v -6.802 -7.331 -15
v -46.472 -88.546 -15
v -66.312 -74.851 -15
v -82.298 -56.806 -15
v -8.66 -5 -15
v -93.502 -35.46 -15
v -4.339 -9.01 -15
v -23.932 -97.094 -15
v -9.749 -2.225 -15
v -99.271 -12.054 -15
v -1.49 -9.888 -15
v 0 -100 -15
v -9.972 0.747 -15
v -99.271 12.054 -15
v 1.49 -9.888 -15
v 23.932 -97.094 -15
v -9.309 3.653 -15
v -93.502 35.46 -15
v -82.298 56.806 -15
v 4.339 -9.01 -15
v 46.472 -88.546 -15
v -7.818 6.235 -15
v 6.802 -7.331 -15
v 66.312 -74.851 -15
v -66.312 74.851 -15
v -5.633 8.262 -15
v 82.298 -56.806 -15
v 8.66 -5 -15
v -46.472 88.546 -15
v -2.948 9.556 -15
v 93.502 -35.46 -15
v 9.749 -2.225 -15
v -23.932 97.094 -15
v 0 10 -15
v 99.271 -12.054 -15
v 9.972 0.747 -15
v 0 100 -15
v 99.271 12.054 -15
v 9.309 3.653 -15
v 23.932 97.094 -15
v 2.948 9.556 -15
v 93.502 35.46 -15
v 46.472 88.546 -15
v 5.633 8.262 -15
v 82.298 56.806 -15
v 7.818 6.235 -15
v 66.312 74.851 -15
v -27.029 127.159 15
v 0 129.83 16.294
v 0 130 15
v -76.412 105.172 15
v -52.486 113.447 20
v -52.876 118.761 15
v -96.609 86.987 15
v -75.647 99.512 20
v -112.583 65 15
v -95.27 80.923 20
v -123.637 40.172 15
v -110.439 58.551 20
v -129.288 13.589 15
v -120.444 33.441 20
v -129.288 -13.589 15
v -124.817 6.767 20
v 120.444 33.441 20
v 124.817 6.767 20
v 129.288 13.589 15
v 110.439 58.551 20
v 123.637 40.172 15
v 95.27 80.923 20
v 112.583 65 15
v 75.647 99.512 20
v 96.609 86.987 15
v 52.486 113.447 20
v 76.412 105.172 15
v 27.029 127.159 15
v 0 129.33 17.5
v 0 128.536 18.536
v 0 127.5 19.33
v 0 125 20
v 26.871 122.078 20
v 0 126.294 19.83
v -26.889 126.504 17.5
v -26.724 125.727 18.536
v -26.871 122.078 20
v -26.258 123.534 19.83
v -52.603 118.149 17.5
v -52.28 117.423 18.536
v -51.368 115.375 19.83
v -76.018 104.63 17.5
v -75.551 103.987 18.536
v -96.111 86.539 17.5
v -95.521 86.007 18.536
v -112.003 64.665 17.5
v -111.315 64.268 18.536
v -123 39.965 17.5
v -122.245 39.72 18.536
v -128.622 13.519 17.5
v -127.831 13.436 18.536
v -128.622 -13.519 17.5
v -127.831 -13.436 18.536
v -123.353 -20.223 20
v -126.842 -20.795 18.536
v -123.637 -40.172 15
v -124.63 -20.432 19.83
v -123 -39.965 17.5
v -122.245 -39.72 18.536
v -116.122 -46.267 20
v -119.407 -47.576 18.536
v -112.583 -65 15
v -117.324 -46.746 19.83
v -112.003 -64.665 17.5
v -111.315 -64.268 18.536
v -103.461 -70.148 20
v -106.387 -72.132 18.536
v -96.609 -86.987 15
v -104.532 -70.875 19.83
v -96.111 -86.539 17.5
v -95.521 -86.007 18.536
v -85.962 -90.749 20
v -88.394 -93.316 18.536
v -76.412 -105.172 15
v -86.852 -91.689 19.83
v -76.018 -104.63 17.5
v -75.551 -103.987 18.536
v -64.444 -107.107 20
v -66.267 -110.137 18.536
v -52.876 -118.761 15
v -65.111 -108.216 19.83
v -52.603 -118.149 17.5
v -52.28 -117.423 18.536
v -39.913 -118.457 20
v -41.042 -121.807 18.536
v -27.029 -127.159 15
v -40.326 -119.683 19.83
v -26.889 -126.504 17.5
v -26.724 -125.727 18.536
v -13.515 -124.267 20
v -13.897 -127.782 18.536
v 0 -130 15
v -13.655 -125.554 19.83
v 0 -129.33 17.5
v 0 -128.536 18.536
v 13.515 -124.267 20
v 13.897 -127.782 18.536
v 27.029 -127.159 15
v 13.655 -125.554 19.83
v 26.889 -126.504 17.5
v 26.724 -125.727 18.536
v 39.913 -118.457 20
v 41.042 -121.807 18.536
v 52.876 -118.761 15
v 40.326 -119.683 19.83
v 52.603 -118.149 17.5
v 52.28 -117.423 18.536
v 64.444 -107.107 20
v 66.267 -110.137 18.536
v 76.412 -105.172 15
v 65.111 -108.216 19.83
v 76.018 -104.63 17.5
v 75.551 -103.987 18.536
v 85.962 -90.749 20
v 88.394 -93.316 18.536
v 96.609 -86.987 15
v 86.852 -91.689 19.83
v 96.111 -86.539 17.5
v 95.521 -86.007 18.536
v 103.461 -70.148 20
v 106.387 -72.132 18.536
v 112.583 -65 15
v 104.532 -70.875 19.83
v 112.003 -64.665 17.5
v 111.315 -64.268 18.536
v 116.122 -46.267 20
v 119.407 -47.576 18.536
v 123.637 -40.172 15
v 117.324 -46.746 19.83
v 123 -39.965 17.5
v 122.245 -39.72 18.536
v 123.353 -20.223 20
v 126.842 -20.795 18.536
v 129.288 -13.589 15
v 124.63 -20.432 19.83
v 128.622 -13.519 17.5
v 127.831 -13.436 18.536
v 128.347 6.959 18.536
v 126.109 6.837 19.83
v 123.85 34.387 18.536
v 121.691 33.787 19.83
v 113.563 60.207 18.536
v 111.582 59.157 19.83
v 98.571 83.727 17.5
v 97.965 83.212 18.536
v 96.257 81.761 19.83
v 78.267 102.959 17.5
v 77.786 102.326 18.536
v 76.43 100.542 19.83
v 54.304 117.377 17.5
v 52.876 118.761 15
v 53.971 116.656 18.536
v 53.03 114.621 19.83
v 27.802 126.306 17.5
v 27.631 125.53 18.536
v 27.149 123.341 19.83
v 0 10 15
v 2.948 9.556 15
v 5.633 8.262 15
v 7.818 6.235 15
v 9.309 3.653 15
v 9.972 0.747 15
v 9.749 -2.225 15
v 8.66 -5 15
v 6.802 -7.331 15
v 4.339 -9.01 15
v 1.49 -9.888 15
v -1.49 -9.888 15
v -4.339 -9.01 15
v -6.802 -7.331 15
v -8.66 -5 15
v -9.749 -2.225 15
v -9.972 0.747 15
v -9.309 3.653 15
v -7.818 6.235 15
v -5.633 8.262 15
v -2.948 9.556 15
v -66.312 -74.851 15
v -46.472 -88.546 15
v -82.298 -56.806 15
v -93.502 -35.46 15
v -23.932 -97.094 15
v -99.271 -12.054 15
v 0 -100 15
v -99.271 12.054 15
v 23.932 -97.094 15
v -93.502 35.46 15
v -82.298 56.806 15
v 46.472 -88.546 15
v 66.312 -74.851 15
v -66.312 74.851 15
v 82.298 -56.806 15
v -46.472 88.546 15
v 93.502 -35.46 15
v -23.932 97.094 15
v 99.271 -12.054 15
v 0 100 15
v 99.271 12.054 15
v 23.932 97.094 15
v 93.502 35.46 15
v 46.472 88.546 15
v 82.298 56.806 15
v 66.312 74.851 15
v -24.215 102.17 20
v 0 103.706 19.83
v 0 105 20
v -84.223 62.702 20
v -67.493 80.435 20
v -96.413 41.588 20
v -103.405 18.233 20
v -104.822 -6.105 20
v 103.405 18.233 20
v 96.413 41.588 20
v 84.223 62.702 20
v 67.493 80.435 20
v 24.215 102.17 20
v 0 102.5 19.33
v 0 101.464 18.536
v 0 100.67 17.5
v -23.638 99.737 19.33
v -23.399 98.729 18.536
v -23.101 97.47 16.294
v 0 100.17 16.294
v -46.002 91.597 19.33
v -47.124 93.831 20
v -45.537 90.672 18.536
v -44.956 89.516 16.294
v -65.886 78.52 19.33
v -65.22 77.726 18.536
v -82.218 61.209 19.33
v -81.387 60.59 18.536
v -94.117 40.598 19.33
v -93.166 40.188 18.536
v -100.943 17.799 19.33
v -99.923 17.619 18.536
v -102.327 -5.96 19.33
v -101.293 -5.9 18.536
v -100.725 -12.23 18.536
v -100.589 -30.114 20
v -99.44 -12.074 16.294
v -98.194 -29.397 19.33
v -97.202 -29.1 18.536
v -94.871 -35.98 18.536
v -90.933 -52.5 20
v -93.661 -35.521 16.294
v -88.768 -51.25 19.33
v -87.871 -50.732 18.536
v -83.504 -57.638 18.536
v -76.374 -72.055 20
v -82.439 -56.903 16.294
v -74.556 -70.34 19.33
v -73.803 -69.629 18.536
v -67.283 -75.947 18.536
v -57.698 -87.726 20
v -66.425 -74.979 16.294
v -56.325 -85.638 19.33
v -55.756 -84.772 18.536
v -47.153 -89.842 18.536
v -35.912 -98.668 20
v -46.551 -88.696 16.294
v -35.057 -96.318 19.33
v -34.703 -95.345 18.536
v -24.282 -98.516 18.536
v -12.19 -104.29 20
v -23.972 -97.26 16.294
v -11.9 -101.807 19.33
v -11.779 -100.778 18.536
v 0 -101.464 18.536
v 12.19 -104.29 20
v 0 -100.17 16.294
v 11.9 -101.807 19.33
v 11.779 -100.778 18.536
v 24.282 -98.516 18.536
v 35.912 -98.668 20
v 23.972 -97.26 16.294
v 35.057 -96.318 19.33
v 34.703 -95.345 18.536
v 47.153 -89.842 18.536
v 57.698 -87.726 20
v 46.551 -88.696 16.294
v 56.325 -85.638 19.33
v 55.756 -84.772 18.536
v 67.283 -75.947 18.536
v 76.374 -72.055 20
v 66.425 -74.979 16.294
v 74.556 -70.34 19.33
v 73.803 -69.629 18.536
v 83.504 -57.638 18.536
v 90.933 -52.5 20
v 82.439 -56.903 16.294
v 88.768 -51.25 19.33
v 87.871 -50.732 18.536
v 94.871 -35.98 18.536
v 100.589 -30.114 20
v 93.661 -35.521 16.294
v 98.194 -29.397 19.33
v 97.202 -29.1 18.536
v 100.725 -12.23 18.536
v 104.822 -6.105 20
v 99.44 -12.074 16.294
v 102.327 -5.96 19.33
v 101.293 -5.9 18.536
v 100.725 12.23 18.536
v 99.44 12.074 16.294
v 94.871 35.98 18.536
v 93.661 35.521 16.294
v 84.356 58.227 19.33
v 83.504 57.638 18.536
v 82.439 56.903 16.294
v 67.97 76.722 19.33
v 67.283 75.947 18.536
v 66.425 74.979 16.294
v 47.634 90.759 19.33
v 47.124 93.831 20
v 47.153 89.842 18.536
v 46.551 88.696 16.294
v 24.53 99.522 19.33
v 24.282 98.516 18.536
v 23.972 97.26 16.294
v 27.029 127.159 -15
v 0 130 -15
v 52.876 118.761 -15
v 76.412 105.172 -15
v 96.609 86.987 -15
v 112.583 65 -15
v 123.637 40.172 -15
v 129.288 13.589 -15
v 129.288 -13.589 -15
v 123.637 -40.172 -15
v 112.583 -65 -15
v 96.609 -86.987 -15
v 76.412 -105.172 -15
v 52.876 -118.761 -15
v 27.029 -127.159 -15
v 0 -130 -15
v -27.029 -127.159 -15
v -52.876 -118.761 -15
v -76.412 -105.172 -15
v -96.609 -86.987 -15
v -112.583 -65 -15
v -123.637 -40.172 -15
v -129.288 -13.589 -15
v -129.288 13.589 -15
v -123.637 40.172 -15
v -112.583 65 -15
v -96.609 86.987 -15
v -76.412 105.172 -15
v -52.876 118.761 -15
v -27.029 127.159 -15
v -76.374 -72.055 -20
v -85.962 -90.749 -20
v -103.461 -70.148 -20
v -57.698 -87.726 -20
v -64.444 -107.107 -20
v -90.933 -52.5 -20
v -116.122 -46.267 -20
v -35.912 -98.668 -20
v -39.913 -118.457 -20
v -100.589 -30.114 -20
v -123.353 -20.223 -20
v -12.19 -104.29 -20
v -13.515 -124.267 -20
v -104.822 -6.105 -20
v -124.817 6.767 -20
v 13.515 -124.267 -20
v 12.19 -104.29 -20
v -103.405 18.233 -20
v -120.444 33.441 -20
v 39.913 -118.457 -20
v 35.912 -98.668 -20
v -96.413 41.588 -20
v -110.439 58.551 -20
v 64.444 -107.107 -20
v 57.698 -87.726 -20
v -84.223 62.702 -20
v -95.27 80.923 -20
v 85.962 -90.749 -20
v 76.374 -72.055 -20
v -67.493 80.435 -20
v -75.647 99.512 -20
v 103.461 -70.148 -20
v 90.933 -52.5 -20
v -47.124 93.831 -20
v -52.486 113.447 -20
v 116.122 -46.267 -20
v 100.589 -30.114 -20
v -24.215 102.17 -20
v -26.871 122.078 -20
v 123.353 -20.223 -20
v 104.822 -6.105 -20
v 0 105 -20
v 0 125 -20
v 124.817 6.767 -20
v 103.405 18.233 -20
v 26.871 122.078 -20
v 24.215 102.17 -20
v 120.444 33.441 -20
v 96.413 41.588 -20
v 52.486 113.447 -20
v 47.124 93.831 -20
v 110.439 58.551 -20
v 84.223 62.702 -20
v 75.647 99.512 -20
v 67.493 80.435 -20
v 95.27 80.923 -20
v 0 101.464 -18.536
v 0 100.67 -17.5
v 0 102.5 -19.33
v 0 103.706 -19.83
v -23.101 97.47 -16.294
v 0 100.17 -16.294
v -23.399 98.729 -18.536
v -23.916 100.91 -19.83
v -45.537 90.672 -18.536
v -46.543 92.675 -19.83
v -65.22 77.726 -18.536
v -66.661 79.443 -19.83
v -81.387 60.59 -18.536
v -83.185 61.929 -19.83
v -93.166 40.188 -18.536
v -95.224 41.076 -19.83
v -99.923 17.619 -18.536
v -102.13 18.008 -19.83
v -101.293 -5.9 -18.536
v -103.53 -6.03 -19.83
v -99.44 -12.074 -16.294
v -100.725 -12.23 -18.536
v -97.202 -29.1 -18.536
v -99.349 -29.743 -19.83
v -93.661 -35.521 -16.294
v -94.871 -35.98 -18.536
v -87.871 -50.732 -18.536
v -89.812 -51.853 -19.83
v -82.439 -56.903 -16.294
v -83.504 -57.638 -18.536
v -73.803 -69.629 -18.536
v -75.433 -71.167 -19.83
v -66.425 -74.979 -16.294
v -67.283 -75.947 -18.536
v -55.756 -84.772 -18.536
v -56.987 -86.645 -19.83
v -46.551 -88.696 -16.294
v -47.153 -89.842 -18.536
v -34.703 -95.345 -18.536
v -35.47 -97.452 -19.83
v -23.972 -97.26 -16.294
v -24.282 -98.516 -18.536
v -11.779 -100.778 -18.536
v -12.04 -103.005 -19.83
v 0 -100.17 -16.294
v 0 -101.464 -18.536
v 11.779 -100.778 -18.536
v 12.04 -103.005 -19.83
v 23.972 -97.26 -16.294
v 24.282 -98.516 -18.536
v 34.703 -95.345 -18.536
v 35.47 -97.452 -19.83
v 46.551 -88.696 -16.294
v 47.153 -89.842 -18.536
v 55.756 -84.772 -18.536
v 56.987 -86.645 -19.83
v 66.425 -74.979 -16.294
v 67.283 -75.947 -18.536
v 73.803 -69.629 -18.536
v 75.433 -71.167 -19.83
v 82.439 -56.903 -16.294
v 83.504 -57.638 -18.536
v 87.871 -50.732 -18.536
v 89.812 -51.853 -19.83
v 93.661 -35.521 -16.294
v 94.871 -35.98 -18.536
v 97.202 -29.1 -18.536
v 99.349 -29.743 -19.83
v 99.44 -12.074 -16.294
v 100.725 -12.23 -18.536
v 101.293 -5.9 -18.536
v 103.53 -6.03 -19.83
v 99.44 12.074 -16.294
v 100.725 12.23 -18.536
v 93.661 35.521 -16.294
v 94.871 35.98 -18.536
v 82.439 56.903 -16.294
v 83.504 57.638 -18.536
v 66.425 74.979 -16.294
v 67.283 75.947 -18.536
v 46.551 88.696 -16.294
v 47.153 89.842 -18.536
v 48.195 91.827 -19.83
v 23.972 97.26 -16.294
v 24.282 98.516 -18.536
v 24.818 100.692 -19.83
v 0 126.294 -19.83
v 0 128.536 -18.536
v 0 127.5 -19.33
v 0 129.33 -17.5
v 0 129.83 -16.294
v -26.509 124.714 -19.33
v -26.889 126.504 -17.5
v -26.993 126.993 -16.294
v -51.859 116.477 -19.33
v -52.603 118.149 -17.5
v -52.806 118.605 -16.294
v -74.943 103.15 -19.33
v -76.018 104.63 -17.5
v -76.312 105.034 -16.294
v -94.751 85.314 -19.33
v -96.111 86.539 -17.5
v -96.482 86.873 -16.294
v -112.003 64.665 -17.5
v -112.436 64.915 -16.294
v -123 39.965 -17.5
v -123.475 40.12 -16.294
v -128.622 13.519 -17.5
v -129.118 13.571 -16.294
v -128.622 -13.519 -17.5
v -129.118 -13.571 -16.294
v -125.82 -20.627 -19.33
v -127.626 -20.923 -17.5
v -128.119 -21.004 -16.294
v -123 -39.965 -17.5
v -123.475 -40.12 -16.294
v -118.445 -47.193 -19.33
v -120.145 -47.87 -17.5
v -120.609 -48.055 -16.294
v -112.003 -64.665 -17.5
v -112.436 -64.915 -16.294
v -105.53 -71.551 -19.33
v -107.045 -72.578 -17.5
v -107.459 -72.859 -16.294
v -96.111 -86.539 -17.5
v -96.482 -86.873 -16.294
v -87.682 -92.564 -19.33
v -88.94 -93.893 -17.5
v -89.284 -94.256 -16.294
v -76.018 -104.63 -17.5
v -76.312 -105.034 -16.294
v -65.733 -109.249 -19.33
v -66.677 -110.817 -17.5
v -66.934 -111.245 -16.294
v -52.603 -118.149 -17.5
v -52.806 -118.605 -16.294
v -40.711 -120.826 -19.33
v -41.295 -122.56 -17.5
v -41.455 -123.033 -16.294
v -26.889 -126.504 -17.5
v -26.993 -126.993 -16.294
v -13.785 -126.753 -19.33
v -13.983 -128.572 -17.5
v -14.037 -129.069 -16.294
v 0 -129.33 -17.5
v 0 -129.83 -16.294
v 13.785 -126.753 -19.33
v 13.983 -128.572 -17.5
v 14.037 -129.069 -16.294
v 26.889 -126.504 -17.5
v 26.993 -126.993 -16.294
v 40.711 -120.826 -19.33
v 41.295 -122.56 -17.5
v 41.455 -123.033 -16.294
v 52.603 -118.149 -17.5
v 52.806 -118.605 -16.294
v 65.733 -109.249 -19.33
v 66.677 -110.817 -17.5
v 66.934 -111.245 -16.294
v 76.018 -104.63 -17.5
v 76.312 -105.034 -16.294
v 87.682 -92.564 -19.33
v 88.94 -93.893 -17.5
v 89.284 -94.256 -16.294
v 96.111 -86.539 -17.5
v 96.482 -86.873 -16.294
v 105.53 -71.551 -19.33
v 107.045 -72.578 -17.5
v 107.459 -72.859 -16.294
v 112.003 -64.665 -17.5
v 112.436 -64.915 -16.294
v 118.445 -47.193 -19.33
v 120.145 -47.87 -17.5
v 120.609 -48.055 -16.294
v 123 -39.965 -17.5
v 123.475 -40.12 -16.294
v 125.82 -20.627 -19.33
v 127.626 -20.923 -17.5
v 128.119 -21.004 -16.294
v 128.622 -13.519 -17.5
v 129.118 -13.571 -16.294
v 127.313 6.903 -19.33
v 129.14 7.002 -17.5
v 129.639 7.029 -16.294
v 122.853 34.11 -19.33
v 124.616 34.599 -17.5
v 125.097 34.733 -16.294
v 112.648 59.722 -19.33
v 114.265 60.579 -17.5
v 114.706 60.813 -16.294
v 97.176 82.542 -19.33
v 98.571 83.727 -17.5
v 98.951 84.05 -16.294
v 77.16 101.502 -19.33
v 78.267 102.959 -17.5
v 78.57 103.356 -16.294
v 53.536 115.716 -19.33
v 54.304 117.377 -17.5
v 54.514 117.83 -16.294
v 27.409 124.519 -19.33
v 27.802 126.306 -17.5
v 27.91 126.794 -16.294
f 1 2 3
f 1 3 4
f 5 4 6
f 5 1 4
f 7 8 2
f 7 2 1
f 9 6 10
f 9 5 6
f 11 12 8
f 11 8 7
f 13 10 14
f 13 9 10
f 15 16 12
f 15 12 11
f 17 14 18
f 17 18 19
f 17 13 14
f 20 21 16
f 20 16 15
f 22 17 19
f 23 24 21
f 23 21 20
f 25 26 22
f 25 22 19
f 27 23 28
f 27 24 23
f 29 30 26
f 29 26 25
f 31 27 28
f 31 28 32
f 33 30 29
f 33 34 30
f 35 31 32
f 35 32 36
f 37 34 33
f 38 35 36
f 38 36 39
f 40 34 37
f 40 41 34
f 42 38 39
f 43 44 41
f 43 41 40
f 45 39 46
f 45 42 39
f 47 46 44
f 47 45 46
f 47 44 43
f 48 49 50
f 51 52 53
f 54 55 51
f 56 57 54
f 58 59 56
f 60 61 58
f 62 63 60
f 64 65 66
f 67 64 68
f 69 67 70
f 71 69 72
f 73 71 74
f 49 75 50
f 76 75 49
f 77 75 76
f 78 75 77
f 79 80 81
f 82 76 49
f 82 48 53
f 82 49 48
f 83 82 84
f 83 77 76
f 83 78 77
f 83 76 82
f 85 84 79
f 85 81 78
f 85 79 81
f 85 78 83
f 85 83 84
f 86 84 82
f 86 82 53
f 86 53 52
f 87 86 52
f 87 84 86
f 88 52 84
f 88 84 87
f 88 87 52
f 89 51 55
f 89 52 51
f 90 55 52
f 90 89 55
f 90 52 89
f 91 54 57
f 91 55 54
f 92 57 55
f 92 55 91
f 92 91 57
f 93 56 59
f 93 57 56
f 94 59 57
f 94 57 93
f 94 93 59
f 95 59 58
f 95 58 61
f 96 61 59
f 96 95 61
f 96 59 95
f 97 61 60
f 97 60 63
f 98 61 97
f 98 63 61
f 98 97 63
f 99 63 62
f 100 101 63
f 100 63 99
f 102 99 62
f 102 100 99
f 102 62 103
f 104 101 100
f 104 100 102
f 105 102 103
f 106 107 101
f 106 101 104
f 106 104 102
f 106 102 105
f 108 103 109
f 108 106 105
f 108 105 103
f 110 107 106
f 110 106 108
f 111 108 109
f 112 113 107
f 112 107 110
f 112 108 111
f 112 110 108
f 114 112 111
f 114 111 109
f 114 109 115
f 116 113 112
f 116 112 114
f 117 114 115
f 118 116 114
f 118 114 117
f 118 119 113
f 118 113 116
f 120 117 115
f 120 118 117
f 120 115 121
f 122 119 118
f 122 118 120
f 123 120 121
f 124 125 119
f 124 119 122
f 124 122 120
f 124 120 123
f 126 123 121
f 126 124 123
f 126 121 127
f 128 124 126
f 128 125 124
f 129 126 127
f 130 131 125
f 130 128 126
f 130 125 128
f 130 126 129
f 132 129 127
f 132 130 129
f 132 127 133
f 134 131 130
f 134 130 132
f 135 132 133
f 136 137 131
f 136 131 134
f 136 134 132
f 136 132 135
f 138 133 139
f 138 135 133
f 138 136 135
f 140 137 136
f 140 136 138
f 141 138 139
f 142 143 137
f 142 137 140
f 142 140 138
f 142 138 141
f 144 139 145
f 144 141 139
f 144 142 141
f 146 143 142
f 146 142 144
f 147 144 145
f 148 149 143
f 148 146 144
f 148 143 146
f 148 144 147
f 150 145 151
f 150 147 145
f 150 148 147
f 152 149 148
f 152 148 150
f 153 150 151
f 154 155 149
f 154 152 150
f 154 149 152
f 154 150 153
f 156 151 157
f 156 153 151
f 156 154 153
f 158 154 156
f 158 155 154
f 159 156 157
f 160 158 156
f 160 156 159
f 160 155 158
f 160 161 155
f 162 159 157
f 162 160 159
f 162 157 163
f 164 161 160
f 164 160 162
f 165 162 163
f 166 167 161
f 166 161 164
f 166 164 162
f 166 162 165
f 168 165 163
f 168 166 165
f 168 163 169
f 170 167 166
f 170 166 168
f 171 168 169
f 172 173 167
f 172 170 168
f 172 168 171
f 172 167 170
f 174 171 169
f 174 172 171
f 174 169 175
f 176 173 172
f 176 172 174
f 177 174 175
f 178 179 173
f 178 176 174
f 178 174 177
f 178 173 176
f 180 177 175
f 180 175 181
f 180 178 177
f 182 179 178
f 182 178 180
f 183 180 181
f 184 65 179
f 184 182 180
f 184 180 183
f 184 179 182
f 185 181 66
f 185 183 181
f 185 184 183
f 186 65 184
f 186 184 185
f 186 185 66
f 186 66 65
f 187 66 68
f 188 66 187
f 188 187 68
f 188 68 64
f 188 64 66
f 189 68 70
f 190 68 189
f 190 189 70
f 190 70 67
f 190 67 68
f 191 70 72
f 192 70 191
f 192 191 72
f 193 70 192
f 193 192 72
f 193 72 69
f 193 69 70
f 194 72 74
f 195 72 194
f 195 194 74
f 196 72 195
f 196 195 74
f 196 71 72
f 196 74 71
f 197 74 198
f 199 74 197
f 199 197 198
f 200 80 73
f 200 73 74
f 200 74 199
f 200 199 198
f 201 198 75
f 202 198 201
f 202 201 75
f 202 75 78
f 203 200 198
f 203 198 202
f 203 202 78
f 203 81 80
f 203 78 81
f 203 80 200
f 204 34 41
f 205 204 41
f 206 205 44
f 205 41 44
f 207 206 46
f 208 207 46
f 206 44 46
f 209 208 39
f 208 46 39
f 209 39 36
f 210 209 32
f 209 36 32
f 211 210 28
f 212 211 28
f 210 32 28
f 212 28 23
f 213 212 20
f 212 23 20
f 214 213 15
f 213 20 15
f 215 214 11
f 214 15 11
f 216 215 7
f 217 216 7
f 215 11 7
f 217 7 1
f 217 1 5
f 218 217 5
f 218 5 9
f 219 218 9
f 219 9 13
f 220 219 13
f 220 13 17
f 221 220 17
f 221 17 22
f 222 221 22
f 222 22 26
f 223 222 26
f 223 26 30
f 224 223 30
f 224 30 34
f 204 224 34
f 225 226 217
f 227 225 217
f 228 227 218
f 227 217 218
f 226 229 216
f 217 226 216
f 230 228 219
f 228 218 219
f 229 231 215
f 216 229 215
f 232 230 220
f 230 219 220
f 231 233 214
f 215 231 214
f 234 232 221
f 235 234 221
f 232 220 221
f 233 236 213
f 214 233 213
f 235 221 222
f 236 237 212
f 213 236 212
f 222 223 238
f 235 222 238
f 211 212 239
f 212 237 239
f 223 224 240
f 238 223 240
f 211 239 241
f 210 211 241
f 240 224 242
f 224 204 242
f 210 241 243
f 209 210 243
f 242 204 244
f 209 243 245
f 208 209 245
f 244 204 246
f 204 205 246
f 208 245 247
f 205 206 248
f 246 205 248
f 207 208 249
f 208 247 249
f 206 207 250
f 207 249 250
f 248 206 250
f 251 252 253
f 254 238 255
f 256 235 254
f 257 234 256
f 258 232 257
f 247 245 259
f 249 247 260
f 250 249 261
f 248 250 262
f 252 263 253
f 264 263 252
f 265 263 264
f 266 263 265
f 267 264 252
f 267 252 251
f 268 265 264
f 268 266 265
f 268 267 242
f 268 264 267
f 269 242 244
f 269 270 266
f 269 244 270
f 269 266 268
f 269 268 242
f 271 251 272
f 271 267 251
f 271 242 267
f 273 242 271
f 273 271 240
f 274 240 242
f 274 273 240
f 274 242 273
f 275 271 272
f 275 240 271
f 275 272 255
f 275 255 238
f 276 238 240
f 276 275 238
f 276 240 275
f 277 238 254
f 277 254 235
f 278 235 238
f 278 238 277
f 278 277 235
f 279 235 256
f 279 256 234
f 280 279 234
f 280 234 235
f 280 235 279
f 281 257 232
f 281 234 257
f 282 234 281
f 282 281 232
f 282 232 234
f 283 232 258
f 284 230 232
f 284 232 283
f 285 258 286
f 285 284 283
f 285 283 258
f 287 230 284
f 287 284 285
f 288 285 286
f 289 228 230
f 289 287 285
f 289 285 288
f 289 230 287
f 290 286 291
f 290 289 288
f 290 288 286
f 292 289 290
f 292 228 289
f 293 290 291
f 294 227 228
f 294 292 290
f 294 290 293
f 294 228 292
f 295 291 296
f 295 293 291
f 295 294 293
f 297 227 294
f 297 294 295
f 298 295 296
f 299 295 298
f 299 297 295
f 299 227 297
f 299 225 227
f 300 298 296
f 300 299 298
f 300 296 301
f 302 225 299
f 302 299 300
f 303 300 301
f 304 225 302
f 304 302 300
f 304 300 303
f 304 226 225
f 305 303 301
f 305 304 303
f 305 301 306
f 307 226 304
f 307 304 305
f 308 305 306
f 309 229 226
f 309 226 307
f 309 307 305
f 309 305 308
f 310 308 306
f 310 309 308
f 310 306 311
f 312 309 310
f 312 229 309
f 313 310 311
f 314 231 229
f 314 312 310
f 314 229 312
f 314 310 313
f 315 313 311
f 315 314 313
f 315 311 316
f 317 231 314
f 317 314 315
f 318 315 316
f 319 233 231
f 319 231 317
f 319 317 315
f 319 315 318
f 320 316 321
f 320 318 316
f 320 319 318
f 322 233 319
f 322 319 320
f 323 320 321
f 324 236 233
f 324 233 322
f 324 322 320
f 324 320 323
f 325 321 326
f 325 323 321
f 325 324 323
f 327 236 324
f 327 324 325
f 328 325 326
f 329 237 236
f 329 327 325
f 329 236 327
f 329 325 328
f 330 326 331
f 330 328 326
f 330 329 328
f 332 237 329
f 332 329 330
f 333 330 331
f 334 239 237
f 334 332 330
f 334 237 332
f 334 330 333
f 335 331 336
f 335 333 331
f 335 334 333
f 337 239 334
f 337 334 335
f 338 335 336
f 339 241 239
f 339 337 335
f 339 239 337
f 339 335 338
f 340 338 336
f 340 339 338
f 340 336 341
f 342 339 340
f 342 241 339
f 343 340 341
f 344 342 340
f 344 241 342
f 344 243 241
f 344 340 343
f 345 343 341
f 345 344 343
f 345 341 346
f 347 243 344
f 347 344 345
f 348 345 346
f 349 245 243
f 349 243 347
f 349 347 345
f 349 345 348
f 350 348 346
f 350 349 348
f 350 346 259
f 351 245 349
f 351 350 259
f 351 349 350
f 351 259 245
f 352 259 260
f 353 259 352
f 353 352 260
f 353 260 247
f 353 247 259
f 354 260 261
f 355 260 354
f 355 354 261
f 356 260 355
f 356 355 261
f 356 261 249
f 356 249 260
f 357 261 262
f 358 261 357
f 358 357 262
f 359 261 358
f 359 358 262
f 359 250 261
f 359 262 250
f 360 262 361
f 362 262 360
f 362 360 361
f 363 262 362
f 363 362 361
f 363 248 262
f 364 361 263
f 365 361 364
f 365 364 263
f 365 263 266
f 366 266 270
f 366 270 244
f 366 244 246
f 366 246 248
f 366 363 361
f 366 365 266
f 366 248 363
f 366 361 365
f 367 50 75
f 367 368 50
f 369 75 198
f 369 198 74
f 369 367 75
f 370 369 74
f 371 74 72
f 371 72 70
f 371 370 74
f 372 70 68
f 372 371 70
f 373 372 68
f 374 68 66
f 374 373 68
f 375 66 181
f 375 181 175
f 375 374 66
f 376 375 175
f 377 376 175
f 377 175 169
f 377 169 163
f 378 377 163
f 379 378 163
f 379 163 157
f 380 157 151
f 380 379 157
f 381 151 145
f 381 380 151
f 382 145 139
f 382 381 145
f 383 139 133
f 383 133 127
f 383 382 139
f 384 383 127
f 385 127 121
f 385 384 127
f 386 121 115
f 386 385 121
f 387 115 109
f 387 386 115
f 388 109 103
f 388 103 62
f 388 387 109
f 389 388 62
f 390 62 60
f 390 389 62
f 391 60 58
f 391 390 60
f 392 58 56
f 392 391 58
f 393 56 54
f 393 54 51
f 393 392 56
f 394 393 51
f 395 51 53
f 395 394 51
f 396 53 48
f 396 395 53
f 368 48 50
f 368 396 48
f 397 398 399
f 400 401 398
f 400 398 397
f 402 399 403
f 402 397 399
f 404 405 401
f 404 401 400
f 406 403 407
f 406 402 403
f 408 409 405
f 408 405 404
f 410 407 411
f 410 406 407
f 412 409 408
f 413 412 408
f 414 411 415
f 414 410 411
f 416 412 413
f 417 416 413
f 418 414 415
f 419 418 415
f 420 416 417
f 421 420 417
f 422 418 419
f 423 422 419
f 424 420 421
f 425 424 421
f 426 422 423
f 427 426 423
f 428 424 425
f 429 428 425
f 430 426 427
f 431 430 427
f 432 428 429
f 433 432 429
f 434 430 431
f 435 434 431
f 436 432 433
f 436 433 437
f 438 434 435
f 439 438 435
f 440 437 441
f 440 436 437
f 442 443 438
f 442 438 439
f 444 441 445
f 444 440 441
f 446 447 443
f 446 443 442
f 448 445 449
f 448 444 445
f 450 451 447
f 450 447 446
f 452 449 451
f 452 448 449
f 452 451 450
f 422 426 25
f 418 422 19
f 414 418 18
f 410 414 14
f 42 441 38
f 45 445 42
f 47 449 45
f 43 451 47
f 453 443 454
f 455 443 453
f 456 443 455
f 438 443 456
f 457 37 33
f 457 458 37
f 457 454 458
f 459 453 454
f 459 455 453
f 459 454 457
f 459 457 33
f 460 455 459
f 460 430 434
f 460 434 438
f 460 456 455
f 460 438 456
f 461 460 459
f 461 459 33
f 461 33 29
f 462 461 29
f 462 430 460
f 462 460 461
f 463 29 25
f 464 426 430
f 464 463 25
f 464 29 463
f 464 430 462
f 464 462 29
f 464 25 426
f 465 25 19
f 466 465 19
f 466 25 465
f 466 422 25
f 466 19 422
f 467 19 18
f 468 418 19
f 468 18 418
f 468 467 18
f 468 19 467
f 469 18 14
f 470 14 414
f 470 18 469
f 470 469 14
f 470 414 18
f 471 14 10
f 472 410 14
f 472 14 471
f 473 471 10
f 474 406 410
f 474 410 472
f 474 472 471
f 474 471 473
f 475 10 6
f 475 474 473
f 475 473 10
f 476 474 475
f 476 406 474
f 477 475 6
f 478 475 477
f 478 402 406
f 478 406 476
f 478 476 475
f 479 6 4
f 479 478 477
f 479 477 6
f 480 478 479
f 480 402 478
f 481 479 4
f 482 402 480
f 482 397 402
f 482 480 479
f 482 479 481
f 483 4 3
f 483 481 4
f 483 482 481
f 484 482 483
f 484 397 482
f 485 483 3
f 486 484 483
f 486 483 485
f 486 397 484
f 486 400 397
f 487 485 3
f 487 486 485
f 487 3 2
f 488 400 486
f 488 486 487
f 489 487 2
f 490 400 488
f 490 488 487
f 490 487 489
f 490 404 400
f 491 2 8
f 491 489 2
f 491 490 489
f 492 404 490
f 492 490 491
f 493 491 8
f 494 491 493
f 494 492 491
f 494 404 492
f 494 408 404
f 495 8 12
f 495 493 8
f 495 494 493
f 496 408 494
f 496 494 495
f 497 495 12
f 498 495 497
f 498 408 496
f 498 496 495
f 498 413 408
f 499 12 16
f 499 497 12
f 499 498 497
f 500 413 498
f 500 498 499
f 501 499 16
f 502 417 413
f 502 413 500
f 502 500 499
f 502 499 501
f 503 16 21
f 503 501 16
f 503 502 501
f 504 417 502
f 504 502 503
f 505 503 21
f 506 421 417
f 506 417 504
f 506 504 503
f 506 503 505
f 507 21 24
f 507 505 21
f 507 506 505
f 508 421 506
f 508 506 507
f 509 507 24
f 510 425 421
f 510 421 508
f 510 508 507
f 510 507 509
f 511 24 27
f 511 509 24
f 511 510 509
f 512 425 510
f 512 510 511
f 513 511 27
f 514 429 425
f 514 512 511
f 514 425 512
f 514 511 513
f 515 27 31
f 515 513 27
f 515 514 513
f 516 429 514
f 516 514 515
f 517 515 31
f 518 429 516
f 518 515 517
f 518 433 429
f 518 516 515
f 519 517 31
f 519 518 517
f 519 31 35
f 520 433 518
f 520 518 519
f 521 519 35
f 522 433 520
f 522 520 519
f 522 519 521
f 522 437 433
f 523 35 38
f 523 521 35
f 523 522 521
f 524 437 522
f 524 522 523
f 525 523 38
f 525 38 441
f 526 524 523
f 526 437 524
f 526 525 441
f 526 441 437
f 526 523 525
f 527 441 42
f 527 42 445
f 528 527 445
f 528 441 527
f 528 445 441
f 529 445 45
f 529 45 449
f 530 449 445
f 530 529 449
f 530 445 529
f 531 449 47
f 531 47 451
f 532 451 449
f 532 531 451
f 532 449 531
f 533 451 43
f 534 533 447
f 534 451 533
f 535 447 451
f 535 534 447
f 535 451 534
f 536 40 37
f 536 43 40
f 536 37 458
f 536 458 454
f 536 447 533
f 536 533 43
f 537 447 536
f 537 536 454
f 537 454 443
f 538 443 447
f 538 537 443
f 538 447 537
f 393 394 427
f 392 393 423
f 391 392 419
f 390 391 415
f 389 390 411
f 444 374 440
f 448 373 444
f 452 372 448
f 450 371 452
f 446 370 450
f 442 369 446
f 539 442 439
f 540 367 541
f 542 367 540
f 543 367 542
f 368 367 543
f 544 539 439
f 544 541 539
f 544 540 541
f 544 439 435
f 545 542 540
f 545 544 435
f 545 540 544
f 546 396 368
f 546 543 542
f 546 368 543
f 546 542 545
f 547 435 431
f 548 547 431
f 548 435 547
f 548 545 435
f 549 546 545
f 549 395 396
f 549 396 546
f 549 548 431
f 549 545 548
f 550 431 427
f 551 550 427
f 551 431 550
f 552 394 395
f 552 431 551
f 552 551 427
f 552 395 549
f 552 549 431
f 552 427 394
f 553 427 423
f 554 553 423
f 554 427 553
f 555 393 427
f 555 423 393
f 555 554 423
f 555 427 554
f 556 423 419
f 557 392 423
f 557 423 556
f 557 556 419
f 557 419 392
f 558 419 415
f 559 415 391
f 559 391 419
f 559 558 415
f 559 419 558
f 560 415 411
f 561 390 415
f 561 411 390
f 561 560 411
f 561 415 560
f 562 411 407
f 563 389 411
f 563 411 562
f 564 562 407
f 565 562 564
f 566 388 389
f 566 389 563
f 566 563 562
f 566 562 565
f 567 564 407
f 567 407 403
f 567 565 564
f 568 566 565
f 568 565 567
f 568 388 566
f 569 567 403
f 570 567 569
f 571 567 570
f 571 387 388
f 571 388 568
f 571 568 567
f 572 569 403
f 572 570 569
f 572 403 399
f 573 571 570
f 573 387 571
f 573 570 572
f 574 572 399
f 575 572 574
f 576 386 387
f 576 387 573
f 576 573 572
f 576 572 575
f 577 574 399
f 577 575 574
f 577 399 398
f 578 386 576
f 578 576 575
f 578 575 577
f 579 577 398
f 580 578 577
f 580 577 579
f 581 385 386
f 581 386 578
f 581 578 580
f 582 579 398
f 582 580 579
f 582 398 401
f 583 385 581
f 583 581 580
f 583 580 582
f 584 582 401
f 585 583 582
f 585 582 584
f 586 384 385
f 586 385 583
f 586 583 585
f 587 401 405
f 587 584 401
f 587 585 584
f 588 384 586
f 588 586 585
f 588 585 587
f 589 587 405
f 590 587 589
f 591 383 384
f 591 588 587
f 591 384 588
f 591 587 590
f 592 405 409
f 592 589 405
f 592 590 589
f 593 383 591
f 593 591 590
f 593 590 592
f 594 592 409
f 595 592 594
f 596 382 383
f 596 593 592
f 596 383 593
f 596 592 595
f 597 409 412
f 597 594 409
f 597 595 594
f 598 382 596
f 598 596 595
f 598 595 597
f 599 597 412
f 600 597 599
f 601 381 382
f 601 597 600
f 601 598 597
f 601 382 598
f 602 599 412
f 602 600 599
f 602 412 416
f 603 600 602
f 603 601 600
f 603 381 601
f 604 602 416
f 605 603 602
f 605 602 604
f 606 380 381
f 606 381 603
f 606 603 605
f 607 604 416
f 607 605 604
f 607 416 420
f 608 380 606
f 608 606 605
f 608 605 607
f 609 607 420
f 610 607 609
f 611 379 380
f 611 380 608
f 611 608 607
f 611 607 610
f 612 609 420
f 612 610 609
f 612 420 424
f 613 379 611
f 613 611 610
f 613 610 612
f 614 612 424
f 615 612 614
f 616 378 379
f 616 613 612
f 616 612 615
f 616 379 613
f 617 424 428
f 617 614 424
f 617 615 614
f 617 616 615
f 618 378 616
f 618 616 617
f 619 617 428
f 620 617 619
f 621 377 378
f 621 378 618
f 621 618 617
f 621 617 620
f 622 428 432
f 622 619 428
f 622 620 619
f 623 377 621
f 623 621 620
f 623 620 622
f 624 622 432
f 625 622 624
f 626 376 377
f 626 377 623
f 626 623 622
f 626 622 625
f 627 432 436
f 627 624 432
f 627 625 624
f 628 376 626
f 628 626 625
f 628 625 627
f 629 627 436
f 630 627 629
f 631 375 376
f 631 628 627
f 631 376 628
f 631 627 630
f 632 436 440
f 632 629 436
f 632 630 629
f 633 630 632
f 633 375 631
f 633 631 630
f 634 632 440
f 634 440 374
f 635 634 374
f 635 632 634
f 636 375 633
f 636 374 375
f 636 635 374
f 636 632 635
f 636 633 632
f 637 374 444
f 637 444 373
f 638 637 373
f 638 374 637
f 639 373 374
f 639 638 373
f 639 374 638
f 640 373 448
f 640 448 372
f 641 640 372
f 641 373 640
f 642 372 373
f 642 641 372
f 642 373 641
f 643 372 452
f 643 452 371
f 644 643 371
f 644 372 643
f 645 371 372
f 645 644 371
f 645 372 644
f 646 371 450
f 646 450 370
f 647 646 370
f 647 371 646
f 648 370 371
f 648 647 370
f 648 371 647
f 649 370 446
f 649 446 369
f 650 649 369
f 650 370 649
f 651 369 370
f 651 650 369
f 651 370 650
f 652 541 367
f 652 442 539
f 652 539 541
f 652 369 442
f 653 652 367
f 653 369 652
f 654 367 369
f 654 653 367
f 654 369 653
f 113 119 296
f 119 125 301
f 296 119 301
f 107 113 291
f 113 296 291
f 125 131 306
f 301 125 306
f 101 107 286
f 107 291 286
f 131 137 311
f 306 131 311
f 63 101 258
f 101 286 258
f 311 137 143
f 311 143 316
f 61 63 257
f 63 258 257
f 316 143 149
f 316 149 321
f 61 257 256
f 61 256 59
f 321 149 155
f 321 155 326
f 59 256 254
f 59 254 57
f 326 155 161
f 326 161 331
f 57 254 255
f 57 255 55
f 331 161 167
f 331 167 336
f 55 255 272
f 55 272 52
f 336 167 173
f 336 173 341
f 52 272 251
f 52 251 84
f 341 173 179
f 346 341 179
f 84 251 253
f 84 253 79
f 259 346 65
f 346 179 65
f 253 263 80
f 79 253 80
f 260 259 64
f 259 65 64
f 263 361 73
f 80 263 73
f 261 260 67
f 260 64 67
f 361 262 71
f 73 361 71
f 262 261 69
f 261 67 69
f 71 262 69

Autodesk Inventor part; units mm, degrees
ref_plane "YZ Plane" through (0, 0, 0) normal (1, 0, 0) x (0, 1, 0)
ref_plane "XZ Plane" through (0, 0, 0) normal (0, 1, 0) x (-1, 0, 0)
ref_plane "XY Plane" through (0, 0, 0) normal (0, 0, 1) x (1, 0, 0)
sketch "Sketch1" plane through (0, 0, 0) normal (1, 0, 0) x (0, 1, 0)
  line L0 (0, 280.159) -> (0, -280.159)
  line L1 (0, 15) -> (100, 15)
  line L2 (100, 15) -> (100, 15)
  line L3 (105, 20) -> (125, 20)
  line L4 (130, 15) -> (130, -15)
  line L5 (125, -20) -> (105, -20)
  line L6 (100, -15) -> (100, -15)
  line L7 (100, -15) -> (0, -15)
  line L8 (0, 15) -> (0, -15)
  line L9 (0, 0) -> (130, 0)
  arc A0 (128, -20) -> (130, -18) centre (128, -18) ccw
  arc A1 (125, -20) -> (130, -15) centre (125, -15) ccw
  arc A2 (130, 15) -> (125, 20) centre (125, 15) ccw
  arc A3 (105, 20) -> (100, 15) centre (105, 15) ccw
  arc A4 (100, -15) -> (105, -20) centre (105, -15) ccw
  line L10 (10, 15) -> (10, -15)
  point P0 (130, 20)
  point P1 (130, -20)
  point P2 (100, -20)
  dimension "d0" = 560.3179
  dimension "d1" = 40
  dimension "d2" = 30
  dimension "d3" = 30
  dimension "d4" = 260
  dimension "d5" = 2
  dimension "d6" = 5
  dimension "d7" = 20
revolve "Revolution1" add sketch "Sketch1" angle 360 about axis through (0, 0, 280.159) along (0, 0, -1) contours L1 A3 L3 A2 L4 L9 L10 | L9 L4 A1 L5 A4 L7 L10
properties part number "wiel"
